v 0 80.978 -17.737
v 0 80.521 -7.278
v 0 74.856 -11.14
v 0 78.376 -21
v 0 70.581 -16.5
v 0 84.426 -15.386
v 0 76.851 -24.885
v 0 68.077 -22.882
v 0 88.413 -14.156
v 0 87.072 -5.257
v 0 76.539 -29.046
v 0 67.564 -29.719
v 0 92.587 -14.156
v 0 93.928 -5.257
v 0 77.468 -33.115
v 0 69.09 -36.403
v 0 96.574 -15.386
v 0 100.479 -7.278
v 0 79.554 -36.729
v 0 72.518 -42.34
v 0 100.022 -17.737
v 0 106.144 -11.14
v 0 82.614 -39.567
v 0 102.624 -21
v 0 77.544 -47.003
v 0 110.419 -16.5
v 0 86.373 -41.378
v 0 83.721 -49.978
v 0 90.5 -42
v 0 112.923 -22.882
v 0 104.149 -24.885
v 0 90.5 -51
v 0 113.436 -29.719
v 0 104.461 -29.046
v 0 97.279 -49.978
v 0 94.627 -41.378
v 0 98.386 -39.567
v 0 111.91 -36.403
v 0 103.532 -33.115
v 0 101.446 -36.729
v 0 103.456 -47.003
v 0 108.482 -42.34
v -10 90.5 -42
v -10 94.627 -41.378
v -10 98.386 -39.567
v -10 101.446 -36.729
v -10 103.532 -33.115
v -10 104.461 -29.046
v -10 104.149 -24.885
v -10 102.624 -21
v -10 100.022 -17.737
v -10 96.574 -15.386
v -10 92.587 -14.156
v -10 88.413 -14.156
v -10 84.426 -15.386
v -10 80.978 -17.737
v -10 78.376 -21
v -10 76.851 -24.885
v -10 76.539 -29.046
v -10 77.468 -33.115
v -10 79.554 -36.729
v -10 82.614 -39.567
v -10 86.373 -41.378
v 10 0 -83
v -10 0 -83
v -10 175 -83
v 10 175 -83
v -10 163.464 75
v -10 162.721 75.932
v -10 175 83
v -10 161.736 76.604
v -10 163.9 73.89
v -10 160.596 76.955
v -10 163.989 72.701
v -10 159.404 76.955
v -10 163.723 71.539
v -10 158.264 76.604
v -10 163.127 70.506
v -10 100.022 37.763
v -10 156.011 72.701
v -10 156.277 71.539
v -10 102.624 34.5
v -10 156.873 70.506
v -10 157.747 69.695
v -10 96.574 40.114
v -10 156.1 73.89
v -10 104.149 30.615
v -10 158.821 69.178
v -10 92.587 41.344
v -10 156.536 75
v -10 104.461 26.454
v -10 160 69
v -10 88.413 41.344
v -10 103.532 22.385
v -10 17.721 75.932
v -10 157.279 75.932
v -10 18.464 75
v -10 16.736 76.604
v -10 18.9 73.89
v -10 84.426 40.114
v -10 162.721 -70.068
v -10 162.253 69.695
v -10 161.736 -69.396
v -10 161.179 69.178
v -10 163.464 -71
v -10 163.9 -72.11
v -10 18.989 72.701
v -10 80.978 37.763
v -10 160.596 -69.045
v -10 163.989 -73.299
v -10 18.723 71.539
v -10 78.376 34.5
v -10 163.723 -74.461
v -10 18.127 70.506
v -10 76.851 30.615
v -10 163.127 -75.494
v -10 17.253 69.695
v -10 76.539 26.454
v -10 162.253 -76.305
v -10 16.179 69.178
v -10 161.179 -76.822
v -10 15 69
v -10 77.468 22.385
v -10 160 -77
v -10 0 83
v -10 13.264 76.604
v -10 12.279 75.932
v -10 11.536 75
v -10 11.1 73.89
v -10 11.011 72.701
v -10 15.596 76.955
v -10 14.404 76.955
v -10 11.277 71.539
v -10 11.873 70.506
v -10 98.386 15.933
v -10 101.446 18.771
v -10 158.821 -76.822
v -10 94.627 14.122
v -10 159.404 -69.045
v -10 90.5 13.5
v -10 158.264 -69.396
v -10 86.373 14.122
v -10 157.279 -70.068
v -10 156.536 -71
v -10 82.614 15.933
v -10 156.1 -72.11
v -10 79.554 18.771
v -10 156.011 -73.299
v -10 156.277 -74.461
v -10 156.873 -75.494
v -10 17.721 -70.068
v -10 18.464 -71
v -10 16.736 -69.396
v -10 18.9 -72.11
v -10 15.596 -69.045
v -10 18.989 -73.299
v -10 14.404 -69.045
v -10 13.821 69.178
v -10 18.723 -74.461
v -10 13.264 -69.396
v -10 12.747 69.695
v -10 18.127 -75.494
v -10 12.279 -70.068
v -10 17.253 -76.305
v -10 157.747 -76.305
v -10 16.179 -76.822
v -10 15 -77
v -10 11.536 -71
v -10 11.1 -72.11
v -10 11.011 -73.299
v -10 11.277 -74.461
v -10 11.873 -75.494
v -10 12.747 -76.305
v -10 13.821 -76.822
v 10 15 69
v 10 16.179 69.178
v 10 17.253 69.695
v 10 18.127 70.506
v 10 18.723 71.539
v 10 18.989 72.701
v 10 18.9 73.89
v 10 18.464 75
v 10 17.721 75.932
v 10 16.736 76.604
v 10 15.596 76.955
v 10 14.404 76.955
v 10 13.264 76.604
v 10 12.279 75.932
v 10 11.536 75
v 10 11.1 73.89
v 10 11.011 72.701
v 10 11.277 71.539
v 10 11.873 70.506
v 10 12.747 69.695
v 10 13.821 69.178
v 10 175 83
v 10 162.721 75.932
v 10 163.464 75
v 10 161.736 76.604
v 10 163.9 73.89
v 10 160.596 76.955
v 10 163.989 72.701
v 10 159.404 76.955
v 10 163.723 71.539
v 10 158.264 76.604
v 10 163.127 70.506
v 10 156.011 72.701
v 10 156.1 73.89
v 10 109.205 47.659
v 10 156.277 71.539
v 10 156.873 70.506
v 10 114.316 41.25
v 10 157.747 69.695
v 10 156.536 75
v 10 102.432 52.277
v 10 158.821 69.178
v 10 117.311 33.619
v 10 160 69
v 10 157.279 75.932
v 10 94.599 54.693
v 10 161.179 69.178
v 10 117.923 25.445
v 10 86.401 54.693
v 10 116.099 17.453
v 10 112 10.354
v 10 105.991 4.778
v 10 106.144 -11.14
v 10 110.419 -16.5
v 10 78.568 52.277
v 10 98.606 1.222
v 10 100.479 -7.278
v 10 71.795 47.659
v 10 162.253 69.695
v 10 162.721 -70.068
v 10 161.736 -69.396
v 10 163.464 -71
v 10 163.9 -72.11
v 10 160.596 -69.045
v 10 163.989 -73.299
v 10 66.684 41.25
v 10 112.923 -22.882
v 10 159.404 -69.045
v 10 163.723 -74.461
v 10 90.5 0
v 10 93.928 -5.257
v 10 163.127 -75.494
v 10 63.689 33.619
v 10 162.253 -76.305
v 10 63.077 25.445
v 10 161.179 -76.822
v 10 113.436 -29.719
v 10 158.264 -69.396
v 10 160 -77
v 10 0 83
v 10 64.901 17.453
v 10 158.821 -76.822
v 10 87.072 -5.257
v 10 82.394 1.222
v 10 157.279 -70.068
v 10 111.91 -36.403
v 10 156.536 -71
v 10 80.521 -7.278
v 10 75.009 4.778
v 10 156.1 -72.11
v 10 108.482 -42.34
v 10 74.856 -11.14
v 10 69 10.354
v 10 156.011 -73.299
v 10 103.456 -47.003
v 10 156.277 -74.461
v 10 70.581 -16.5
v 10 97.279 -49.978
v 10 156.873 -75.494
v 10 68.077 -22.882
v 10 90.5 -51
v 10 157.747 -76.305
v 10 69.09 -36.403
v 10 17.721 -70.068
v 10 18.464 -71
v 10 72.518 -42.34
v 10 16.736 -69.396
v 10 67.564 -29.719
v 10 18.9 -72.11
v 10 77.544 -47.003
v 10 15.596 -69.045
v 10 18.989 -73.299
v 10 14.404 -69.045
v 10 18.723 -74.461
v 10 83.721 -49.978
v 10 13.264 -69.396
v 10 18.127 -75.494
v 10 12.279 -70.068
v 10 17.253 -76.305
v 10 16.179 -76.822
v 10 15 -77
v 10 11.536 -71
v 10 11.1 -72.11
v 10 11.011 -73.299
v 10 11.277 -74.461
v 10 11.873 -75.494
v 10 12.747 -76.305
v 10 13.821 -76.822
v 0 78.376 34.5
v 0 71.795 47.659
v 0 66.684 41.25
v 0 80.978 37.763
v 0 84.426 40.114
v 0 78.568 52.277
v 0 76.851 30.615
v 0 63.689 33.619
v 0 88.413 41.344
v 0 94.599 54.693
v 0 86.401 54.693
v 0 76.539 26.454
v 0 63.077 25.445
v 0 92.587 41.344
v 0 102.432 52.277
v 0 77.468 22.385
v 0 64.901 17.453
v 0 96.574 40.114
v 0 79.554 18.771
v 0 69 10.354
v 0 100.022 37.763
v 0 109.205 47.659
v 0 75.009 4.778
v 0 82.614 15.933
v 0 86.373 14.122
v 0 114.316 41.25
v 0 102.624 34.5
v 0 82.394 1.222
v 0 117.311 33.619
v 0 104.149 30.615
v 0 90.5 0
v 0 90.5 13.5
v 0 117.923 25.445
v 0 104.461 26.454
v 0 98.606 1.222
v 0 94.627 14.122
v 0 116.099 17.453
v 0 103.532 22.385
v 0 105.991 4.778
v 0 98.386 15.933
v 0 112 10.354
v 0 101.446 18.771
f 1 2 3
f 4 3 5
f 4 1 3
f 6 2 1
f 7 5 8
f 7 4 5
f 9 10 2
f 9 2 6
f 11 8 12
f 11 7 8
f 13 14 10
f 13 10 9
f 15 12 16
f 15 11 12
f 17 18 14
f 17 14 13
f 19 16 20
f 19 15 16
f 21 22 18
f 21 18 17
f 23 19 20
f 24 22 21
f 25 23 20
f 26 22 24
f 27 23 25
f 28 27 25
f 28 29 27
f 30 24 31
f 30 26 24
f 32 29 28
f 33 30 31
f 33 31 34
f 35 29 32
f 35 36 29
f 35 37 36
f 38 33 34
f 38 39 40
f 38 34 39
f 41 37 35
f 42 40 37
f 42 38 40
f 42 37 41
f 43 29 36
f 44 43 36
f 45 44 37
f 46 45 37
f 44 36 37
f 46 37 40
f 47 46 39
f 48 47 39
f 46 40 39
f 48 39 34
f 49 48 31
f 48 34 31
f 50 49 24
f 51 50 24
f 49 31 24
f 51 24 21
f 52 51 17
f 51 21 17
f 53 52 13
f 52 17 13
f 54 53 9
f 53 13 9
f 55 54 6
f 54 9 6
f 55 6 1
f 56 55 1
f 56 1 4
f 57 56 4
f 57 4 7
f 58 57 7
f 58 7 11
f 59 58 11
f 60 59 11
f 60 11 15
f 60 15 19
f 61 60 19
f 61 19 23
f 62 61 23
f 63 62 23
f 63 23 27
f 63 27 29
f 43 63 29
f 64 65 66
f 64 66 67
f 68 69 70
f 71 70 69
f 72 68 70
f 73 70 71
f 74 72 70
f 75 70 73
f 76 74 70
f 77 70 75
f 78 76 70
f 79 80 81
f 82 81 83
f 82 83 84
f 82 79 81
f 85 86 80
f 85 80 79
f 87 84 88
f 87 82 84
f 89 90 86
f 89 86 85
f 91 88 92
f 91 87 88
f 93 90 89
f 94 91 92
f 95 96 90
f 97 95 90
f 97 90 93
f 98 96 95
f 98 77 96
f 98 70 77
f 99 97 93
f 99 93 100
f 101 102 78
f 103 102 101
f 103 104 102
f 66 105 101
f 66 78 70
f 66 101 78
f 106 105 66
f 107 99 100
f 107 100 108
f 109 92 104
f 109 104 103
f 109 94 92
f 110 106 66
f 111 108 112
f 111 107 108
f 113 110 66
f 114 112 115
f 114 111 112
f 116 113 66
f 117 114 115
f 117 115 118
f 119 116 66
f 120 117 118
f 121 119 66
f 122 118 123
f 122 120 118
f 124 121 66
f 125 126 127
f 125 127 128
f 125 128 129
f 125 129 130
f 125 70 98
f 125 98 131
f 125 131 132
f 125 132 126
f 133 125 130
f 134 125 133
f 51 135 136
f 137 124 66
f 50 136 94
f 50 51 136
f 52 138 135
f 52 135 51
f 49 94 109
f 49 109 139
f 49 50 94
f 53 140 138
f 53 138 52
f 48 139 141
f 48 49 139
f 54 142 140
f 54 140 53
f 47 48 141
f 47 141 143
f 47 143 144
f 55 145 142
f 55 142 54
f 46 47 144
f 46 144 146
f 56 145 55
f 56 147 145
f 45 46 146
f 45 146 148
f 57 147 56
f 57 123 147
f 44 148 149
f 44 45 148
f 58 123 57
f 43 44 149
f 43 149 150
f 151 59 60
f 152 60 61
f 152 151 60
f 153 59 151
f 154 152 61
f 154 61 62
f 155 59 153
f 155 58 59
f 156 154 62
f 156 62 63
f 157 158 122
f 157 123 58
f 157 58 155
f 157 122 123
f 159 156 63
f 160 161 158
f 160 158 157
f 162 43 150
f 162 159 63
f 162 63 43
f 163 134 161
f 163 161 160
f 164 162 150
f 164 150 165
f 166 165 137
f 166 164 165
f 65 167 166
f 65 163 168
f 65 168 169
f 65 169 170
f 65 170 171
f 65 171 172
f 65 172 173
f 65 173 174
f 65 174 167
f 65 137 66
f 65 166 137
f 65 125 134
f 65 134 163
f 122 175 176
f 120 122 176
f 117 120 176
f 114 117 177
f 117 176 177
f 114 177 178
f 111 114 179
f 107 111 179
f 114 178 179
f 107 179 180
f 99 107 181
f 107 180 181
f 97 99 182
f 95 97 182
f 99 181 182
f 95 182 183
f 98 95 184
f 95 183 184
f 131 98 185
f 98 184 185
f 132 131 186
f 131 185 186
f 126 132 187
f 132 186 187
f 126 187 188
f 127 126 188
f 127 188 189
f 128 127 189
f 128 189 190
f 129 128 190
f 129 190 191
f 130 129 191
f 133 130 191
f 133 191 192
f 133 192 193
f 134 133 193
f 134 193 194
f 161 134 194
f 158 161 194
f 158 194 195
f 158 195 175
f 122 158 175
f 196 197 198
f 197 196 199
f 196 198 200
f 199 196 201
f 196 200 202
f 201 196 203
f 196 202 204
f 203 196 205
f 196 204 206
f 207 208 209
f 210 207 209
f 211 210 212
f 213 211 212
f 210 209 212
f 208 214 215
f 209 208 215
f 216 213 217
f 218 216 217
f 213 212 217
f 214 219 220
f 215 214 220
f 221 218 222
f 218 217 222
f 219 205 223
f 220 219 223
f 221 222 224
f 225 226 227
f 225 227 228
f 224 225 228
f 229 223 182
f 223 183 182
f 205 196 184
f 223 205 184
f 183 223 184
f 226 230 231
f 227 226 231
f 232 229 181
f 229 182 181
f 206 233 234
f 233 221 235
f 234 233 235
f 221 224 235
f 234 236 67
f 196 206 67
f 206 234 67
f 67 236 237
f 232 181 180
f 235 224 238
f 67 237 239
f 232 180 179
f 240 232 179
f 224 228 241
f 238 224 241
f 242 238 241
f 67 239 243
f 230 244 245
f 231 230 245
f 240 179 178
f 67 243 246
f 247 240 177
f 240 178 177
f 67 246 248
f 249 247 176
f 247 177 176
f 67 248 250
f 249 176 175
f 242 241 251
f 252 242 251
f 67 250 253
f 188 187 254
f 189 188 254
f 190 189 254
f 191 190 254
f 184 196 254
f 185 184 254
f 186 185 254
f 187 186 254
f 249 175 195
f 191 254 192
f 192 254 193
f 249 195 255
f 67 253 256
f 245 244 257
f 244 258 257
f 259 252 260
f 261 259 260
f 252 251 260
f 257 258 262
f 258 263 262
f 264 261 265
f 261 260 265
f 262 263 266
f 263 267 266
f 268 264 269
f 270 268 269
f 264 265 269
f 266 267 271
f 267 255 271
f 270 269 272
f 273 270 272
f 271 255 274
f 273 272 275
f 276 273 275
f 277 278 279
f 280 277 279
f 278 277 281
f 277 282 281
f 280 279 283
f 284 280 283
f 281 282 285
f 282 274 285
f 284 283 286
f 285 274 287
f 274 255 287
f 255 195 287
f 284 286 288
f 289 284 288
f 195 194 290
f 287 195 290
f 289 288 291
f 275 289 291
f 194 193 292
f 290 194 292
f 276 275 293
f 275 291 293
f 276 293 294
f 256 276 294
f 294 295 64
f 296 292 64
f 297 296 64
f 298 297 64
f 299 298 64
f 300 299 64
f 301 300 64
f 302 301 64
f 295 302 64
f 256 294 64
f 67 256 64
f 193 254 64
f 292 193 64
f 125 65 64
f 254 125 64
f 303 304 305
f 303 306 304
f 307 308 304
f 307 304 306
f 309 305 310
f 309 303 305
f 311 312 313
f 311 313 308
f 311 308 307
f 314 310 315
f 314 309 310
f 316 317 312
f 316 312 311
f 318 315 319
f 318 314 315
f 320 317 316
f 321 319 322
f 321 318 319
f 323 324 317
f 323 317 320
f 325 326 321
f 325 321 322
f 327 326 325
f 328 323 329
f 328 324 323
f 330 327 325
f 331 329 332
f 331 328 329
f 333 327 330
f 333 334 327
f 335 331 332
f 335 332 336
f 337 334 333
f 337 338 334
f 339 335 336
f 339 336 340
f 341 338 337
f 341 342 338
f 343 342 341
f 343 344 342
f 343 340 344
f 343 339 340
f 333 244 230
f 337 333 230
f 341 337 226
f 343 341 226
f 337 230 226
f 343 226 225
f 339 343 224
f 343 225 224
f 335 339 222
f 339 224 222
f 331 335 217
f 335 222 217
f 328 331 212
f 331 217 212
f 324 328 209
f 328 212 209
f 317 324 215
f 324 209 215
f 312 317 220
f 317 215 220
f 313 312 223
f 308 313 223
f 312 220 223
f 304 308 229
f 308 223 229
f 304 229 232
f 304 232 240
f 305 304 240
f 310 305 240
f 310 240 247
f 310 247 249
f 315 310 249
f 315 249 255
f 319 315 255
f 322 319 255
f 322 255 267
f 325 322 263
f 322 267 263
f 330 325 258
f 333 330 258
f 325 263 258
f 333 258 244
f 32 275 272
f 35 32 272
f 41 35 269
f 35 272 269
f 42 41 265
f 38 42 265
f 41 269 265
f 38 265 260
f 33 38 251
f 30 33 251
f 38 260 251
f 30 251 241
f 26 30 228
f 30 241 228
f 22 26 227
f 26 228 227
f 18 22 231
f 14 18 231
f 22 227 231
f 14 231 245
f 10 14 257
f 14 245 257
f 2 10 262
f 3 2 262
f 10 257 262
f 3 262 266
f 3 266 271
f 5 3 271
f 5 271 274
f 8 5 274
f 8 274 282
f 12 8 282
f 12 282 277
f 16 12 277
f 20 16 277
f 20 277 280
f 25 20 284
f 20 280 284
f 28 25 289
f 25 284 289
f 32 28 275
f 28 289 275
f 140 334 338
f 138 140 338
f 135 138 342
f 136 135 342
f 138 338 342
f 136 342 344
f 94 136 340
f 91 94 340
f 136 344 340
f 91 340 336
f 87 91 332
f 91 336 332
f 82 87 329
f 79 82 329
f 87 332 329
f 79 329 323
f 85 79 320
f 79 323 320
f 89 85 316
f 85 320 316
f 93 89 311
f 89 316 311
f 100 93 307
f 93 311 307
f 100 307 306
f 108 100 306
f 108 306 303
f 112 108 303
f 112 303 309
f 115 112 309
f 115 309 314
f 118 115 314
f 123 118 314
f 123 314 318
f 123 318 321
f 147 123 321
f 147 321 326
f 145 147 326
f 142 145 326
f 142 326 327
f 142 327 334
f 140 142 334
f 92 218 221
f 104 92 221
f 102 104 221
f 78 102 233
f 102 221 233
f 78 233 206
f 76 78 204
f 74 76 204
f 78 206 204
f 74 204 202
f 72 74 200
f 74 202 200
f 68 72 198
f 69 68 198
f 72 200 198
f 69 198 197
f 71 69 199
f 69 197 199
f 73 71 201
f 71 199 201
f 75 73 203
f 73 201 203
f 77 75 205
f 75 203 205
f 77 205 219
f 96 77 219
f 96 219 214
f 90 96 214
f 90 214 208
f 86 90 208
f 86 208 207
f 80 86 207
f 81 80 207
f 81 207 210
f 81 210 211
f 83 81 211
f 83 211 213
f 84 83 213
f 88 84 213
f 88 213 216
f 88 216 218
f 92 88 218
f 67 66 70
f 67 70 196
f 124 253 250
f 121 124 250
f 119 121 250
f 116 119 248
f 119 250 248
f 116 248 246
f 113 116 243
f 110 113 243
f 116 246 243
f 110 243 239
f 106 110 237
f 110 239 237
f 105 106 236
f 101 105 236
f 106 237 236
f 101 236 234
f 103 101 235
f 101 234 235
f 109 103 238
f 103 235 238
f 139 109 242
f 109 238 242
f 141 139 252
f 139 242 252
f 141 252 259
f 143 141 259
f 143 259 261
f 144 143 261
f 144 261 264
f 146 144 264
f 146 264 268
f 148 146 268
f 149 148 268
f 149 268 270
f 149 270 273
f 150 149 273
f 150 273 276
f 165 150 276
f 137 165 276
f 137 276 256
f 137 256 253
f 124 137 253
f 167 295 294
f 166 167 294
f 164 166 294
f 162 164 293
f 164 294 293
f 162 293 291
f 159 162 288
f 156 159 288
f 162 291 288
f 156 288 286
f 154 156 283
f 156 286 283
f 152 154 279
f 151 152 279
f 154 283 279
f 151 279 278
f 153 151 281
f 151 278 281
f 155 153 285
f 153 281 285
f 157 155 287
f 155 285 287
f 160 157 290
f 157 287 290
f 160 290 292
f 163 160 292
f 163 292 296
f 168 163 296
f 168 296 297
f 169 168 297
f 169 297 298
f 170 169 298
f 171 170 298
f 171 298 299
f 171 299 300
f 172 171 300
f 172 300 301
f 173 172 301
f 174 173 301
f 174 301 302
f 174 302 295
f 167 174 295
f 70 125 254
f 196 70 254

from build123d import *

# Parameters (mm, degrees)
SKETCH1_W           = 20
SKETCH1_H           = 166
BOSS_EXTRUDE1_DEPTH = 175
SKETCH2_R           = 14
CUT_EXTRUDE1_DEPTH  = 175
SKETCH3_R           = 27.5
SKETCH3_R_2         = 23
CUT_EXTRUDE2_DEPTH  = 10
SKETCH4_R           = 4
CUT_EXTRUDE3_DEPTH  = 21


with BuildPart() as part:
    # Sketch1 → Boss-Extrude1 (new body)
    with BuildSketch(Plane(origin=(0, 0, 0), x_dir=(1, 0, 0), z_dir=(0, 1, 0))):
        Rectangle(SKETCH1_W, SKETCH1_H)
    extrude(amount=BOSS_EXTRUDE1_DEPTH)

    # Sketch2 → Cut-Extrude1 (cut)
    with BuildSketch(Plane(origin=(10, 0, 0), x_dir=(0, 0, -1), z_dir=(1, 0, 0))):
        with Locations((-27.5, 90.5)):
            Circle(SKETCH2_R)
        with Locations((28, 90.5)):
            Circle(SKETCH2_R)
    extrude(amount=-CUT_EXTRUDE1_DEPTH, mode=Mode.SUBTRACT)

    # Sketch3 → Cut-Extrude2 (cut)
    with BuildSketch(Plane(origin=(10, 0, 0), x_dir=(0, 0, -1), z_dir=(1, 0, 0))):
        with Locations((-27.5, 90.5)):
            Circle(SKETCH3_R)
        with Locations((28, 90.5)):
            Circle(SKETCH3_R_2)
    extrude(amount=-CUT_EXTRUDE2_DEPTH, mode=Mode.SUBTRACT)

    # Sketch4 → Cut-Extrude3 (cut, through all)
    with BuildSketch(Plane(origin=(10, 0, 0), x_dir=(0, 0, -1), z_dir=(1, 0, 0))):
        with Locations((73, 160)):
            Circle(SKETCH4_R)
        with Locations((73, 15)):
            Circle(SKETCH4_R)
        with Locations((-73, 15)):
            Circle(SKETCH4_R)
        with Locations((-73, 160)):
            Circle(SKETCH4_R)
    extrude(amount=-CUT_EXTRUDE3_DEPTH, mode=Mode.SUBTRACT)


solid = part.part
